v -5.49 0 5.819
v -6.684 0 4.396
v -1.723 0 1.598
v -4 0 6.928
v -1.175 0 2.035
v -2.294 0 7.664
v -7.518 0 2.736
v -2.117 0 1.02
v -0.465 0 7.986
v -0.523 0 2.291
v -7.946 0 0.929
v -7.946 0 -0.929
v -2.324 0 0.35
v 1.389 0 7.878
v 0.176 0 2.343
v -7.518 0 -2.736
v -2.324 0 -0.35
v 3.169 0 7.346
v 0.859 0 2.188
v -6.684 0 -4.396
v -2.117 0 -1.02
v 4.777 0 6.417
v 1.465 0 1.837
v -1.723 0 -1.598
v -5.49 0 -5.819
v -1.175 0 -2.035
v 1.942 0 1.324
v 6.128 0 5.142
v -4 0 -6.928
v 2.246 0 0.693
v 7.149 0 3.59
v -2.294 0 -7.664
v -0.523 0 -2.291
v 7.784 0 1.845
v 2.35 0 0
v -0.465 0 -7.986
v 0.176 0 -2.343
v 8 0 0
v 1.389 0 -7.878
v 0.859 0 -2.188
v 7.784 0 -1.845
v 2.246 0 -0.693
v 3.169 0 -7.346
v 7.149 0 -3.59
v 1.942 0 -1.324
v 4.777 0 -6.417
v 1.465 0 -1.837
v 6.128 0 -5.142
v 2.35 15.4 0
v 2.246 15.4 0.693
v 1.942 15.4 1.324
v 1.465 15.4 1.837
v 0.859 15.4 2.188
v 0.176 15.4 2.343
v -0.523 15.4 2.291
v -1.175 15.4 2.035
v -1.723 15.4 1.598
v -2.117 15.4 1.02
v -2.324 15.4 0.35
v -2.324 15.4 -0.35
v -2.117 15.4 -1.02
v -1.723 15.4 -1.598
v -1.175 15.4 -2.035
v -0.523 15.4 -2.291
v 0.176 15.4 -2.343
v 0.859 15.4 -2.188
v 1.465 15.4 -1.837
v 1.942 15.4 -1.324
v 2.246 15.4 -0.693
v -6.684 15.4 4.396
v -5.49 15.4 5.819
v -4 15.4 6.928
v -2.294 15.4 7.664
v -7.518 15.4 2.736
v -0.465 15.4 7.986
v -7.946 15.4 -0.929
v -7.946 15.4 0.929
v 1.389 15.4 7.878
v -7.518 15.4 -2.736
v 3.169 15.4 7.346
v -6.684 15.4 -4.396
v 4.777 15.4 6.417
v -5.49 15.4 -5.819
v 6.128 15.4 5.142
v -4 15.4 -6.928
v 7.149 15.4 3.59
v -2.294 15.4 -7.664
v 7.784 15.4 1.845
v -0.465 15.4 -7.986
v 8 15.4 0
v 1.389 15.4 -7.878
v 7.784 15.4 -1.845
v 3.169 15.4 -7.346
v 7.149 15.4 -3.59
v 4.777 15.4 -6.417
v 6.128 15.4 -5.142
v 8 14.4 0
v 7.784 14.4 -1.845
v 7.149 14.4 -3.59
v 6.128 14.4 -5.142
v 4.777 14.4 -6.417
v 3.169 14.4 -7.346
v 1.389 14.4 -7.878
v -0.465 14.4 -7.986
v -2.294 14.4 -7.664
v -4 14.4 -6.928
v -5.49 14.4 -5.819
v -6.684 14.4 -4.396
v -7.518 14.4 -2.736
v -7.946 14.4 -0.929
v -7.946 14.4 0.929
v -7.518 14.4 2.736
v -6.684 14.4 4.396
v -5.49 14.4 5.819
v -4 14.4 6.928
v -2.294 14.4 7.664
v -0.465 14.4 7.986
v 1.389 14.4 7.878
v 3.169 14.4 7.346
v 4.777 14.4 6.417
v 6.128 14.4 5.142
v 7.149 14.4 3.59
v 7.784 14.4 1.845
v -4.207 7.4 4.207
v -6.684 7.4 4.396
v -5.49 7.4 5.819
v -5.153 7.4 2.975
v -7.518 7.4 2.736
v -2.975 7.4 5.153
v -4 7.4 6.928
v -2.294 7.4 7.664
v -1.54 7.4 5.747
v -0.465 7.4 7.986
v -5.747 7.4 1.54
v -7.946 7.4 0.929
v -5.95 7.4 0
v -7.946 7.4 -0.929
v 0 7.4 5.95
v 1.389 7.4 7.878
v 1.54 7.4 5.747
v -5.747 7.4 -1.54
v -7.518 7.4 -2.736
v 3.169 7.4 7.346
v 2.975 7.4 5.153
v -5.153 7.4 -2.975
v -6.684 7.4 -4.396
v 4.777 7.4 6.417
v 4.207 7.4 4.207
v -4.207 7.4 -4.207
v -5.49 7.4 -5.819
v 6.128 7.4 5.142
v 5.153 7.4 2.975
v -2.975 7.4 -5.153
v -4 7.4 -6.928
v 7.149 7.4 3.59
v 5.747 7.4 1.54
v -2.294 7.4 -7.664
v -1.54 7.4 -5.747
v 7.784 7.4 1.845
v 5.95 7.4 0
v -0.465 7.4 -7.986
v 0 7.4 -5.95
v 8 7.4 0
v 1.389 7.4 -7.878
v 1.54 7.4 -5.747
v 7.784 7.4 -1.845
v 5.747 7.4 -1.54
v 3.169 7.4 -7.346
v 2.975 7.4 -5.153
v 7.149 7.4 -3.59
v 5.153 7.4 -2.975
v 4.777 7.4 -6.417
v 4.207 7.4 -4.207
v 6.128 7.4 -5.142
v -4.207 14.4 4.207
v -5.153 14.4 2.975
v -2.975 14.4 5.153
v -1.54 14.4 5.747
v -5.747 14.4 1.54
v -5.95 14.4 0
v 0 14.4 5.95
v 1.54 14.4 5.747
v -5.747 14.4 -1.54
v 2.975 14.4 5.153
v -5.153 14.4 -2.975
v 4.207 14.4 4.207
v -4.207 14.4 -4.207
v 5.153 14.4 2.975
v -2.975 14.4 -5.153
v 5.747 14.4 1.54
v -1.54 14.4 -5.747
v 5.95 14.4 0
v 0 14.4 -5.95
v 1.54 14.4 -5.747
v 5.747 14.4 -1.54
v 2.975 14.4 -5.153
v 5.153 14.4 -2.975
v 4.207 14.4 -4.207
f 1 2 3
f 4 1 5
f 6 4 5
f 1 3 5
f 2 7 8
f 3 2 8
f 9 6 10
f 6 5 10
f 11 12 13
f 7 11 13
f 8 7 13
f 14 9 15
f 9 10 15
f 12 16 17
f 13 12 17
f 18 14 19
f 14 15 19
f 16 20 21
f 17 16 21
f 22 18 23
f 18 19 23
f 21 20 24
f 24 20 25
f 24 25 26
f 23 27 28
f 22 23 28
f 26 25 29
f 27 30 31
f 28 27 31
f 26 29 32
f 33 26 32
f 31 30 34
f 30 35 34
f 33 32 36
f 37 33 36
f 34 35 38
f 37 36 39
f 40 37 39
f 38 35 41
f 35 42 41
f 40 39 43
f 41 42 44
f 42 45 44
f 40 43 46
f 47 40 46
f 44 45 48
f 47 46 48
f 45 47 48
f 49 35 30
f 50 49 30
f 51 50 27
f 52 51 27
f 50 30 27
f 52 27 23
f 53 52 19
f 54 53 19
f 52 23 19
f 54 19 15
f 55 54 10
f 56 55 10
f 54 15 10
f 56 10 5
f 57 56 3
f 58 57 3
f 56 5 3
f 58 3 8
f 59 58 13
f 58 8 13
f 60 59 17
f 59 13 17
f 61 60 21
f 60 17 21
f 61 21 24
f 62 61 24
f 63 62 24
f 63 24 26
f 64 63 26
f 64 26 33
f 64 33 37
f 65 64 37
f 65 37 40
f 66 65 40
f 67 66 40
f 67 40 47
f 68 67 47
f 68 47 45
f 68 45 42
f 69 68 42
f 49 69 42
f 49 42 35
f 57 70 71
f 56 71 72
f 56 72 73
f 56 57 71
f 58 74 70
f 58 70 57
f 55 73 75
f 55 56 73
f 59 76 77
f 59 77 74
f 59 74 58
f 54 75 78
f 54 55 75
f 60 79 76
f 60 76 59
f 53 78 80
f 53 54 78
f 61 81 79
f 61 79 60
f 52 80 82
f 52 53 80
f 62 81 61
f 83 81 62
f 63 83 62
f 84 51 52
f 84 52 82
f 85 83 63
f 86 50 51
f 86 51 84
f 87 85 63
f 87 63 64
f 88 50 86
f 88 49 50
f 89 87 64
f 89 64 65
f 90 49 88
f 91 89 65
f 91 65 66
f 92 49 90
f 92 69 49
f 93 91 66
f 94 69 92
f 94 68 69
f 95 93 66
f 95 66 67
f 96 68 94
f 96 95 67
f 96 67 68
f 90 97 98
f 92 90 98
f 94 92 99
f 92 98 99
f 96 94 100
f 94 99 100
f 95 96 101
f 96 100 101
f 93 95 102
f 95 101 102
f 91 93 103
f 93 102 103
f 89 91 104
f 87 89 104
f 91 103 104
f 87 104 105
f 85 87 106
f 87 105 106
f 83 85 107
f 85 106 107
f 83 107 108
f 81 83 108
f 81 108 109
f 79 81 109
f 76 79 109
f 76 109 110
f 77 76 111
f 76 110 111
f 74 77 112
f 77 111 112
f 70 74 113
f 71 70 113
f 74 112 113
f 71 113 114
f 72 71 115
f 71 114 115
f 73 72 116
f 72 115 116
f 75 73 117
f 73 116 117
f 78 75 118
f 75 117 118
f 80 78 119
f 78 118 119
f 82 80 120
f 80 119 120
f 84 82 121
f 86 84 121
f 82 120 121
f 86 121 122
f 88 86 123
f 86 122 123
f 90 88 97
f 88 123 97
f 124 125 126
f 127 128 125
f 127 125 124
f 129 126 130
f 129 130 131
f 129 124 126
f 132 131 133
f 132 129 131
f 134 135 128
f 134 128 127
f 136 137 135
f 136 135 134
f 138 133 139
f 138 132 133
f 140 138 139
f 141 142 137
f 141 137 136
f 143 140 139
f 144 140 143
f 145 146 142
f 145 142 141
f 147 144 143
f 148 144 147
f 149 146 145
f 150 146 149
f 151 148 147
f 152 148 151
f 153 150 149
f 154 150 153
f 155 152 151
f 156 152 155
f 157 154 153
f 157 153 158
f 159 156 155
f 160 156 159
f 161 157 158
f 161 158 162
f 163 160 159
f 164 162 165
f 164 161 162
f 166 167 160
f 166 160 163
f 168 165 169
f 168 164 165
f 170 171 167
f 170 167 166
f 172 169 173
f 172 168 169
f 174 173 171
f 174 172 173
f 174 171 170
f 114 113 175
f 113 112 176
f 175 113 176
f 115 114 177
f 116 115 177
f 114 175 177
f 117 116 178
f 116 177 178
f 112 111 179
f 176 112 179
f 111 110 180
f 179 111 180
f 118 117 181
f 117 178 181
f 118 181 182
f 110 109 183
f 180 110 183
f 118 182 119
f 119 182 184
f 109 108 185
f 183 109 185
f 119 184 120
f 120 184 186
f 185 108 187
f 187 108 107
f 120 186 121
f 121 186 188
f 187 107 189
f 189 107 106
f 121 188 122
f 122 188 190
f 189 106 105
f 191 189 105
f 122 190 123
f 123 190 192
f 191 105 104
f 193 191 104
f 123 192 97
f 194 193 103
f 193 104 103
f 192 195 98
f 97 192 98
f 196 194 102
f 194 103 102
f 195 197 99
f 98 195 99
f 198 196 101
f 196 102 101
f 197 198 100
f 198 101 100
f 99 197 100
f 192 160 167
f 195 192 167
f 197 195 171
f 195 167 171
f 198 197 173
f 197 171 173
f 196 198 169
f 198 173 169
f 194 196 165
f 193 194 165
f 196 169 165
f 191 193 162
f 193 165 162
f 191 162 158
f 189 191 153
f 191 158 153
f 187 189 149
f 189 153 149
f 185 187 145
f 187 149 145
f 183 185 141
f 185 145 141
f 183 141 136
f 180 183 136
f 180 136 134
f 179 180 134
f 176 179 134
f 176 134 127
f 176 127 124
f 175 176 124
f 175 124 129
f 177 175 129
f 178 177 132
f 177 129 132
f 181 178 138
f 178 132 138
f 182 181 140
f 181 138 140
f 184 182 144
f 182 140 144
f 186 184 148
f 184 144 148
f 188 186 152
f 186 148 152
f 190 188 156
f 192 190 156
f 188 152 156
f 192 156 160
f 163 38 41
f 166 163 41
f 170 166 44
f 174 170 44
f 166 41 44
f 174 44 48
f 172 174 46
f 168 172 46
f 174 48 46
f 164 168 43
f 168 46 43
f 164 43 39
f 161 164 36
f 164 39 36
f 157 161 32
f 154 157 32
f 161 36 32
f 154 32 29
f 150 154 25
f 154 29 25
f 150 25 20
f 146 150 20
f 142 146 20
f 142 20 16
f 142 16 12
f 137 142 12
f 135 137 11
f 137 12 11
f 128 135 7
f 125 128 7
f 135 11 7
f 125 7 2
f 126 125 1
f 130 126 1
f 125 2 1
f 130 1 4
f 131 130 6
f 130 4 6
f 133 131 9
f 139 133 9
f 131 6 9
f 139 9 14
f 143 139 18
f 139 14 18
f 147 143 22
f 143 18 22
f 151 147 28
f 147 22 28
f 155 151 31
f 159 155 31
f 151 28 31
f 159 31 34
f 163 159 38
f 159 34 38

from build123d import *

# Parameters (mm, degrees)
SKETCH1_R           = 8
BOSS_EXTRUDE1_DEPTH = 7.4
SKETCH2_R           = 5.95
BOSS_EXTRUDE2_DEPTH = 7
SKETCH3_R           = 8
BOSS_EXTRUDE3_DEPTH = 1
SKETCH4_R           = 2.35
CUT_EXTRUDE1_DEPTH  = 21


with BuildPart() as part:
    # Sketch1 → Boss-Extrude1 (new body)
    with BuildSketch(Plane(origin=(0, 0, 0), x_dir=(1, 0, 0), z_dir=(0, 1, 0))):
        Circle(SKETCH1_R)
    extrude(amount=BOSS_EXTRUDE1_DEPTH)

    # Sketch2 → Boss-Extrude2 (add)
    with BuildSketch(Plane(origin=(0, 7.4, 0), x_dir=(1, 0, 0), z_dir=(0, 1, 0))):
        Circle(SKETCH2_R)
    extrude(amount=BOSS_EXTRUDE2_DEPTH)

    # Sketch3 → Boss-Extrude3 (add)
    with BuildSketch(Plane(origin=(0, 14.4, 0), x_dir=(1, 0, 0), z_dir=(0, 1, 0))):
        Circle(SKETCH3_R)
    extrude(amount=BOSS_EXTRUDE3_DEPTH)

    # Sketch4 → Cut-Extrude1 (cut)
    with BuildSketch(Plane.XZ):
        Circle(SKETCH4_R)
    extrude(amount=-CUT_EXTRUDE1_DEPTH, mode=Mode.SUBTRACT)


solid = part.part
